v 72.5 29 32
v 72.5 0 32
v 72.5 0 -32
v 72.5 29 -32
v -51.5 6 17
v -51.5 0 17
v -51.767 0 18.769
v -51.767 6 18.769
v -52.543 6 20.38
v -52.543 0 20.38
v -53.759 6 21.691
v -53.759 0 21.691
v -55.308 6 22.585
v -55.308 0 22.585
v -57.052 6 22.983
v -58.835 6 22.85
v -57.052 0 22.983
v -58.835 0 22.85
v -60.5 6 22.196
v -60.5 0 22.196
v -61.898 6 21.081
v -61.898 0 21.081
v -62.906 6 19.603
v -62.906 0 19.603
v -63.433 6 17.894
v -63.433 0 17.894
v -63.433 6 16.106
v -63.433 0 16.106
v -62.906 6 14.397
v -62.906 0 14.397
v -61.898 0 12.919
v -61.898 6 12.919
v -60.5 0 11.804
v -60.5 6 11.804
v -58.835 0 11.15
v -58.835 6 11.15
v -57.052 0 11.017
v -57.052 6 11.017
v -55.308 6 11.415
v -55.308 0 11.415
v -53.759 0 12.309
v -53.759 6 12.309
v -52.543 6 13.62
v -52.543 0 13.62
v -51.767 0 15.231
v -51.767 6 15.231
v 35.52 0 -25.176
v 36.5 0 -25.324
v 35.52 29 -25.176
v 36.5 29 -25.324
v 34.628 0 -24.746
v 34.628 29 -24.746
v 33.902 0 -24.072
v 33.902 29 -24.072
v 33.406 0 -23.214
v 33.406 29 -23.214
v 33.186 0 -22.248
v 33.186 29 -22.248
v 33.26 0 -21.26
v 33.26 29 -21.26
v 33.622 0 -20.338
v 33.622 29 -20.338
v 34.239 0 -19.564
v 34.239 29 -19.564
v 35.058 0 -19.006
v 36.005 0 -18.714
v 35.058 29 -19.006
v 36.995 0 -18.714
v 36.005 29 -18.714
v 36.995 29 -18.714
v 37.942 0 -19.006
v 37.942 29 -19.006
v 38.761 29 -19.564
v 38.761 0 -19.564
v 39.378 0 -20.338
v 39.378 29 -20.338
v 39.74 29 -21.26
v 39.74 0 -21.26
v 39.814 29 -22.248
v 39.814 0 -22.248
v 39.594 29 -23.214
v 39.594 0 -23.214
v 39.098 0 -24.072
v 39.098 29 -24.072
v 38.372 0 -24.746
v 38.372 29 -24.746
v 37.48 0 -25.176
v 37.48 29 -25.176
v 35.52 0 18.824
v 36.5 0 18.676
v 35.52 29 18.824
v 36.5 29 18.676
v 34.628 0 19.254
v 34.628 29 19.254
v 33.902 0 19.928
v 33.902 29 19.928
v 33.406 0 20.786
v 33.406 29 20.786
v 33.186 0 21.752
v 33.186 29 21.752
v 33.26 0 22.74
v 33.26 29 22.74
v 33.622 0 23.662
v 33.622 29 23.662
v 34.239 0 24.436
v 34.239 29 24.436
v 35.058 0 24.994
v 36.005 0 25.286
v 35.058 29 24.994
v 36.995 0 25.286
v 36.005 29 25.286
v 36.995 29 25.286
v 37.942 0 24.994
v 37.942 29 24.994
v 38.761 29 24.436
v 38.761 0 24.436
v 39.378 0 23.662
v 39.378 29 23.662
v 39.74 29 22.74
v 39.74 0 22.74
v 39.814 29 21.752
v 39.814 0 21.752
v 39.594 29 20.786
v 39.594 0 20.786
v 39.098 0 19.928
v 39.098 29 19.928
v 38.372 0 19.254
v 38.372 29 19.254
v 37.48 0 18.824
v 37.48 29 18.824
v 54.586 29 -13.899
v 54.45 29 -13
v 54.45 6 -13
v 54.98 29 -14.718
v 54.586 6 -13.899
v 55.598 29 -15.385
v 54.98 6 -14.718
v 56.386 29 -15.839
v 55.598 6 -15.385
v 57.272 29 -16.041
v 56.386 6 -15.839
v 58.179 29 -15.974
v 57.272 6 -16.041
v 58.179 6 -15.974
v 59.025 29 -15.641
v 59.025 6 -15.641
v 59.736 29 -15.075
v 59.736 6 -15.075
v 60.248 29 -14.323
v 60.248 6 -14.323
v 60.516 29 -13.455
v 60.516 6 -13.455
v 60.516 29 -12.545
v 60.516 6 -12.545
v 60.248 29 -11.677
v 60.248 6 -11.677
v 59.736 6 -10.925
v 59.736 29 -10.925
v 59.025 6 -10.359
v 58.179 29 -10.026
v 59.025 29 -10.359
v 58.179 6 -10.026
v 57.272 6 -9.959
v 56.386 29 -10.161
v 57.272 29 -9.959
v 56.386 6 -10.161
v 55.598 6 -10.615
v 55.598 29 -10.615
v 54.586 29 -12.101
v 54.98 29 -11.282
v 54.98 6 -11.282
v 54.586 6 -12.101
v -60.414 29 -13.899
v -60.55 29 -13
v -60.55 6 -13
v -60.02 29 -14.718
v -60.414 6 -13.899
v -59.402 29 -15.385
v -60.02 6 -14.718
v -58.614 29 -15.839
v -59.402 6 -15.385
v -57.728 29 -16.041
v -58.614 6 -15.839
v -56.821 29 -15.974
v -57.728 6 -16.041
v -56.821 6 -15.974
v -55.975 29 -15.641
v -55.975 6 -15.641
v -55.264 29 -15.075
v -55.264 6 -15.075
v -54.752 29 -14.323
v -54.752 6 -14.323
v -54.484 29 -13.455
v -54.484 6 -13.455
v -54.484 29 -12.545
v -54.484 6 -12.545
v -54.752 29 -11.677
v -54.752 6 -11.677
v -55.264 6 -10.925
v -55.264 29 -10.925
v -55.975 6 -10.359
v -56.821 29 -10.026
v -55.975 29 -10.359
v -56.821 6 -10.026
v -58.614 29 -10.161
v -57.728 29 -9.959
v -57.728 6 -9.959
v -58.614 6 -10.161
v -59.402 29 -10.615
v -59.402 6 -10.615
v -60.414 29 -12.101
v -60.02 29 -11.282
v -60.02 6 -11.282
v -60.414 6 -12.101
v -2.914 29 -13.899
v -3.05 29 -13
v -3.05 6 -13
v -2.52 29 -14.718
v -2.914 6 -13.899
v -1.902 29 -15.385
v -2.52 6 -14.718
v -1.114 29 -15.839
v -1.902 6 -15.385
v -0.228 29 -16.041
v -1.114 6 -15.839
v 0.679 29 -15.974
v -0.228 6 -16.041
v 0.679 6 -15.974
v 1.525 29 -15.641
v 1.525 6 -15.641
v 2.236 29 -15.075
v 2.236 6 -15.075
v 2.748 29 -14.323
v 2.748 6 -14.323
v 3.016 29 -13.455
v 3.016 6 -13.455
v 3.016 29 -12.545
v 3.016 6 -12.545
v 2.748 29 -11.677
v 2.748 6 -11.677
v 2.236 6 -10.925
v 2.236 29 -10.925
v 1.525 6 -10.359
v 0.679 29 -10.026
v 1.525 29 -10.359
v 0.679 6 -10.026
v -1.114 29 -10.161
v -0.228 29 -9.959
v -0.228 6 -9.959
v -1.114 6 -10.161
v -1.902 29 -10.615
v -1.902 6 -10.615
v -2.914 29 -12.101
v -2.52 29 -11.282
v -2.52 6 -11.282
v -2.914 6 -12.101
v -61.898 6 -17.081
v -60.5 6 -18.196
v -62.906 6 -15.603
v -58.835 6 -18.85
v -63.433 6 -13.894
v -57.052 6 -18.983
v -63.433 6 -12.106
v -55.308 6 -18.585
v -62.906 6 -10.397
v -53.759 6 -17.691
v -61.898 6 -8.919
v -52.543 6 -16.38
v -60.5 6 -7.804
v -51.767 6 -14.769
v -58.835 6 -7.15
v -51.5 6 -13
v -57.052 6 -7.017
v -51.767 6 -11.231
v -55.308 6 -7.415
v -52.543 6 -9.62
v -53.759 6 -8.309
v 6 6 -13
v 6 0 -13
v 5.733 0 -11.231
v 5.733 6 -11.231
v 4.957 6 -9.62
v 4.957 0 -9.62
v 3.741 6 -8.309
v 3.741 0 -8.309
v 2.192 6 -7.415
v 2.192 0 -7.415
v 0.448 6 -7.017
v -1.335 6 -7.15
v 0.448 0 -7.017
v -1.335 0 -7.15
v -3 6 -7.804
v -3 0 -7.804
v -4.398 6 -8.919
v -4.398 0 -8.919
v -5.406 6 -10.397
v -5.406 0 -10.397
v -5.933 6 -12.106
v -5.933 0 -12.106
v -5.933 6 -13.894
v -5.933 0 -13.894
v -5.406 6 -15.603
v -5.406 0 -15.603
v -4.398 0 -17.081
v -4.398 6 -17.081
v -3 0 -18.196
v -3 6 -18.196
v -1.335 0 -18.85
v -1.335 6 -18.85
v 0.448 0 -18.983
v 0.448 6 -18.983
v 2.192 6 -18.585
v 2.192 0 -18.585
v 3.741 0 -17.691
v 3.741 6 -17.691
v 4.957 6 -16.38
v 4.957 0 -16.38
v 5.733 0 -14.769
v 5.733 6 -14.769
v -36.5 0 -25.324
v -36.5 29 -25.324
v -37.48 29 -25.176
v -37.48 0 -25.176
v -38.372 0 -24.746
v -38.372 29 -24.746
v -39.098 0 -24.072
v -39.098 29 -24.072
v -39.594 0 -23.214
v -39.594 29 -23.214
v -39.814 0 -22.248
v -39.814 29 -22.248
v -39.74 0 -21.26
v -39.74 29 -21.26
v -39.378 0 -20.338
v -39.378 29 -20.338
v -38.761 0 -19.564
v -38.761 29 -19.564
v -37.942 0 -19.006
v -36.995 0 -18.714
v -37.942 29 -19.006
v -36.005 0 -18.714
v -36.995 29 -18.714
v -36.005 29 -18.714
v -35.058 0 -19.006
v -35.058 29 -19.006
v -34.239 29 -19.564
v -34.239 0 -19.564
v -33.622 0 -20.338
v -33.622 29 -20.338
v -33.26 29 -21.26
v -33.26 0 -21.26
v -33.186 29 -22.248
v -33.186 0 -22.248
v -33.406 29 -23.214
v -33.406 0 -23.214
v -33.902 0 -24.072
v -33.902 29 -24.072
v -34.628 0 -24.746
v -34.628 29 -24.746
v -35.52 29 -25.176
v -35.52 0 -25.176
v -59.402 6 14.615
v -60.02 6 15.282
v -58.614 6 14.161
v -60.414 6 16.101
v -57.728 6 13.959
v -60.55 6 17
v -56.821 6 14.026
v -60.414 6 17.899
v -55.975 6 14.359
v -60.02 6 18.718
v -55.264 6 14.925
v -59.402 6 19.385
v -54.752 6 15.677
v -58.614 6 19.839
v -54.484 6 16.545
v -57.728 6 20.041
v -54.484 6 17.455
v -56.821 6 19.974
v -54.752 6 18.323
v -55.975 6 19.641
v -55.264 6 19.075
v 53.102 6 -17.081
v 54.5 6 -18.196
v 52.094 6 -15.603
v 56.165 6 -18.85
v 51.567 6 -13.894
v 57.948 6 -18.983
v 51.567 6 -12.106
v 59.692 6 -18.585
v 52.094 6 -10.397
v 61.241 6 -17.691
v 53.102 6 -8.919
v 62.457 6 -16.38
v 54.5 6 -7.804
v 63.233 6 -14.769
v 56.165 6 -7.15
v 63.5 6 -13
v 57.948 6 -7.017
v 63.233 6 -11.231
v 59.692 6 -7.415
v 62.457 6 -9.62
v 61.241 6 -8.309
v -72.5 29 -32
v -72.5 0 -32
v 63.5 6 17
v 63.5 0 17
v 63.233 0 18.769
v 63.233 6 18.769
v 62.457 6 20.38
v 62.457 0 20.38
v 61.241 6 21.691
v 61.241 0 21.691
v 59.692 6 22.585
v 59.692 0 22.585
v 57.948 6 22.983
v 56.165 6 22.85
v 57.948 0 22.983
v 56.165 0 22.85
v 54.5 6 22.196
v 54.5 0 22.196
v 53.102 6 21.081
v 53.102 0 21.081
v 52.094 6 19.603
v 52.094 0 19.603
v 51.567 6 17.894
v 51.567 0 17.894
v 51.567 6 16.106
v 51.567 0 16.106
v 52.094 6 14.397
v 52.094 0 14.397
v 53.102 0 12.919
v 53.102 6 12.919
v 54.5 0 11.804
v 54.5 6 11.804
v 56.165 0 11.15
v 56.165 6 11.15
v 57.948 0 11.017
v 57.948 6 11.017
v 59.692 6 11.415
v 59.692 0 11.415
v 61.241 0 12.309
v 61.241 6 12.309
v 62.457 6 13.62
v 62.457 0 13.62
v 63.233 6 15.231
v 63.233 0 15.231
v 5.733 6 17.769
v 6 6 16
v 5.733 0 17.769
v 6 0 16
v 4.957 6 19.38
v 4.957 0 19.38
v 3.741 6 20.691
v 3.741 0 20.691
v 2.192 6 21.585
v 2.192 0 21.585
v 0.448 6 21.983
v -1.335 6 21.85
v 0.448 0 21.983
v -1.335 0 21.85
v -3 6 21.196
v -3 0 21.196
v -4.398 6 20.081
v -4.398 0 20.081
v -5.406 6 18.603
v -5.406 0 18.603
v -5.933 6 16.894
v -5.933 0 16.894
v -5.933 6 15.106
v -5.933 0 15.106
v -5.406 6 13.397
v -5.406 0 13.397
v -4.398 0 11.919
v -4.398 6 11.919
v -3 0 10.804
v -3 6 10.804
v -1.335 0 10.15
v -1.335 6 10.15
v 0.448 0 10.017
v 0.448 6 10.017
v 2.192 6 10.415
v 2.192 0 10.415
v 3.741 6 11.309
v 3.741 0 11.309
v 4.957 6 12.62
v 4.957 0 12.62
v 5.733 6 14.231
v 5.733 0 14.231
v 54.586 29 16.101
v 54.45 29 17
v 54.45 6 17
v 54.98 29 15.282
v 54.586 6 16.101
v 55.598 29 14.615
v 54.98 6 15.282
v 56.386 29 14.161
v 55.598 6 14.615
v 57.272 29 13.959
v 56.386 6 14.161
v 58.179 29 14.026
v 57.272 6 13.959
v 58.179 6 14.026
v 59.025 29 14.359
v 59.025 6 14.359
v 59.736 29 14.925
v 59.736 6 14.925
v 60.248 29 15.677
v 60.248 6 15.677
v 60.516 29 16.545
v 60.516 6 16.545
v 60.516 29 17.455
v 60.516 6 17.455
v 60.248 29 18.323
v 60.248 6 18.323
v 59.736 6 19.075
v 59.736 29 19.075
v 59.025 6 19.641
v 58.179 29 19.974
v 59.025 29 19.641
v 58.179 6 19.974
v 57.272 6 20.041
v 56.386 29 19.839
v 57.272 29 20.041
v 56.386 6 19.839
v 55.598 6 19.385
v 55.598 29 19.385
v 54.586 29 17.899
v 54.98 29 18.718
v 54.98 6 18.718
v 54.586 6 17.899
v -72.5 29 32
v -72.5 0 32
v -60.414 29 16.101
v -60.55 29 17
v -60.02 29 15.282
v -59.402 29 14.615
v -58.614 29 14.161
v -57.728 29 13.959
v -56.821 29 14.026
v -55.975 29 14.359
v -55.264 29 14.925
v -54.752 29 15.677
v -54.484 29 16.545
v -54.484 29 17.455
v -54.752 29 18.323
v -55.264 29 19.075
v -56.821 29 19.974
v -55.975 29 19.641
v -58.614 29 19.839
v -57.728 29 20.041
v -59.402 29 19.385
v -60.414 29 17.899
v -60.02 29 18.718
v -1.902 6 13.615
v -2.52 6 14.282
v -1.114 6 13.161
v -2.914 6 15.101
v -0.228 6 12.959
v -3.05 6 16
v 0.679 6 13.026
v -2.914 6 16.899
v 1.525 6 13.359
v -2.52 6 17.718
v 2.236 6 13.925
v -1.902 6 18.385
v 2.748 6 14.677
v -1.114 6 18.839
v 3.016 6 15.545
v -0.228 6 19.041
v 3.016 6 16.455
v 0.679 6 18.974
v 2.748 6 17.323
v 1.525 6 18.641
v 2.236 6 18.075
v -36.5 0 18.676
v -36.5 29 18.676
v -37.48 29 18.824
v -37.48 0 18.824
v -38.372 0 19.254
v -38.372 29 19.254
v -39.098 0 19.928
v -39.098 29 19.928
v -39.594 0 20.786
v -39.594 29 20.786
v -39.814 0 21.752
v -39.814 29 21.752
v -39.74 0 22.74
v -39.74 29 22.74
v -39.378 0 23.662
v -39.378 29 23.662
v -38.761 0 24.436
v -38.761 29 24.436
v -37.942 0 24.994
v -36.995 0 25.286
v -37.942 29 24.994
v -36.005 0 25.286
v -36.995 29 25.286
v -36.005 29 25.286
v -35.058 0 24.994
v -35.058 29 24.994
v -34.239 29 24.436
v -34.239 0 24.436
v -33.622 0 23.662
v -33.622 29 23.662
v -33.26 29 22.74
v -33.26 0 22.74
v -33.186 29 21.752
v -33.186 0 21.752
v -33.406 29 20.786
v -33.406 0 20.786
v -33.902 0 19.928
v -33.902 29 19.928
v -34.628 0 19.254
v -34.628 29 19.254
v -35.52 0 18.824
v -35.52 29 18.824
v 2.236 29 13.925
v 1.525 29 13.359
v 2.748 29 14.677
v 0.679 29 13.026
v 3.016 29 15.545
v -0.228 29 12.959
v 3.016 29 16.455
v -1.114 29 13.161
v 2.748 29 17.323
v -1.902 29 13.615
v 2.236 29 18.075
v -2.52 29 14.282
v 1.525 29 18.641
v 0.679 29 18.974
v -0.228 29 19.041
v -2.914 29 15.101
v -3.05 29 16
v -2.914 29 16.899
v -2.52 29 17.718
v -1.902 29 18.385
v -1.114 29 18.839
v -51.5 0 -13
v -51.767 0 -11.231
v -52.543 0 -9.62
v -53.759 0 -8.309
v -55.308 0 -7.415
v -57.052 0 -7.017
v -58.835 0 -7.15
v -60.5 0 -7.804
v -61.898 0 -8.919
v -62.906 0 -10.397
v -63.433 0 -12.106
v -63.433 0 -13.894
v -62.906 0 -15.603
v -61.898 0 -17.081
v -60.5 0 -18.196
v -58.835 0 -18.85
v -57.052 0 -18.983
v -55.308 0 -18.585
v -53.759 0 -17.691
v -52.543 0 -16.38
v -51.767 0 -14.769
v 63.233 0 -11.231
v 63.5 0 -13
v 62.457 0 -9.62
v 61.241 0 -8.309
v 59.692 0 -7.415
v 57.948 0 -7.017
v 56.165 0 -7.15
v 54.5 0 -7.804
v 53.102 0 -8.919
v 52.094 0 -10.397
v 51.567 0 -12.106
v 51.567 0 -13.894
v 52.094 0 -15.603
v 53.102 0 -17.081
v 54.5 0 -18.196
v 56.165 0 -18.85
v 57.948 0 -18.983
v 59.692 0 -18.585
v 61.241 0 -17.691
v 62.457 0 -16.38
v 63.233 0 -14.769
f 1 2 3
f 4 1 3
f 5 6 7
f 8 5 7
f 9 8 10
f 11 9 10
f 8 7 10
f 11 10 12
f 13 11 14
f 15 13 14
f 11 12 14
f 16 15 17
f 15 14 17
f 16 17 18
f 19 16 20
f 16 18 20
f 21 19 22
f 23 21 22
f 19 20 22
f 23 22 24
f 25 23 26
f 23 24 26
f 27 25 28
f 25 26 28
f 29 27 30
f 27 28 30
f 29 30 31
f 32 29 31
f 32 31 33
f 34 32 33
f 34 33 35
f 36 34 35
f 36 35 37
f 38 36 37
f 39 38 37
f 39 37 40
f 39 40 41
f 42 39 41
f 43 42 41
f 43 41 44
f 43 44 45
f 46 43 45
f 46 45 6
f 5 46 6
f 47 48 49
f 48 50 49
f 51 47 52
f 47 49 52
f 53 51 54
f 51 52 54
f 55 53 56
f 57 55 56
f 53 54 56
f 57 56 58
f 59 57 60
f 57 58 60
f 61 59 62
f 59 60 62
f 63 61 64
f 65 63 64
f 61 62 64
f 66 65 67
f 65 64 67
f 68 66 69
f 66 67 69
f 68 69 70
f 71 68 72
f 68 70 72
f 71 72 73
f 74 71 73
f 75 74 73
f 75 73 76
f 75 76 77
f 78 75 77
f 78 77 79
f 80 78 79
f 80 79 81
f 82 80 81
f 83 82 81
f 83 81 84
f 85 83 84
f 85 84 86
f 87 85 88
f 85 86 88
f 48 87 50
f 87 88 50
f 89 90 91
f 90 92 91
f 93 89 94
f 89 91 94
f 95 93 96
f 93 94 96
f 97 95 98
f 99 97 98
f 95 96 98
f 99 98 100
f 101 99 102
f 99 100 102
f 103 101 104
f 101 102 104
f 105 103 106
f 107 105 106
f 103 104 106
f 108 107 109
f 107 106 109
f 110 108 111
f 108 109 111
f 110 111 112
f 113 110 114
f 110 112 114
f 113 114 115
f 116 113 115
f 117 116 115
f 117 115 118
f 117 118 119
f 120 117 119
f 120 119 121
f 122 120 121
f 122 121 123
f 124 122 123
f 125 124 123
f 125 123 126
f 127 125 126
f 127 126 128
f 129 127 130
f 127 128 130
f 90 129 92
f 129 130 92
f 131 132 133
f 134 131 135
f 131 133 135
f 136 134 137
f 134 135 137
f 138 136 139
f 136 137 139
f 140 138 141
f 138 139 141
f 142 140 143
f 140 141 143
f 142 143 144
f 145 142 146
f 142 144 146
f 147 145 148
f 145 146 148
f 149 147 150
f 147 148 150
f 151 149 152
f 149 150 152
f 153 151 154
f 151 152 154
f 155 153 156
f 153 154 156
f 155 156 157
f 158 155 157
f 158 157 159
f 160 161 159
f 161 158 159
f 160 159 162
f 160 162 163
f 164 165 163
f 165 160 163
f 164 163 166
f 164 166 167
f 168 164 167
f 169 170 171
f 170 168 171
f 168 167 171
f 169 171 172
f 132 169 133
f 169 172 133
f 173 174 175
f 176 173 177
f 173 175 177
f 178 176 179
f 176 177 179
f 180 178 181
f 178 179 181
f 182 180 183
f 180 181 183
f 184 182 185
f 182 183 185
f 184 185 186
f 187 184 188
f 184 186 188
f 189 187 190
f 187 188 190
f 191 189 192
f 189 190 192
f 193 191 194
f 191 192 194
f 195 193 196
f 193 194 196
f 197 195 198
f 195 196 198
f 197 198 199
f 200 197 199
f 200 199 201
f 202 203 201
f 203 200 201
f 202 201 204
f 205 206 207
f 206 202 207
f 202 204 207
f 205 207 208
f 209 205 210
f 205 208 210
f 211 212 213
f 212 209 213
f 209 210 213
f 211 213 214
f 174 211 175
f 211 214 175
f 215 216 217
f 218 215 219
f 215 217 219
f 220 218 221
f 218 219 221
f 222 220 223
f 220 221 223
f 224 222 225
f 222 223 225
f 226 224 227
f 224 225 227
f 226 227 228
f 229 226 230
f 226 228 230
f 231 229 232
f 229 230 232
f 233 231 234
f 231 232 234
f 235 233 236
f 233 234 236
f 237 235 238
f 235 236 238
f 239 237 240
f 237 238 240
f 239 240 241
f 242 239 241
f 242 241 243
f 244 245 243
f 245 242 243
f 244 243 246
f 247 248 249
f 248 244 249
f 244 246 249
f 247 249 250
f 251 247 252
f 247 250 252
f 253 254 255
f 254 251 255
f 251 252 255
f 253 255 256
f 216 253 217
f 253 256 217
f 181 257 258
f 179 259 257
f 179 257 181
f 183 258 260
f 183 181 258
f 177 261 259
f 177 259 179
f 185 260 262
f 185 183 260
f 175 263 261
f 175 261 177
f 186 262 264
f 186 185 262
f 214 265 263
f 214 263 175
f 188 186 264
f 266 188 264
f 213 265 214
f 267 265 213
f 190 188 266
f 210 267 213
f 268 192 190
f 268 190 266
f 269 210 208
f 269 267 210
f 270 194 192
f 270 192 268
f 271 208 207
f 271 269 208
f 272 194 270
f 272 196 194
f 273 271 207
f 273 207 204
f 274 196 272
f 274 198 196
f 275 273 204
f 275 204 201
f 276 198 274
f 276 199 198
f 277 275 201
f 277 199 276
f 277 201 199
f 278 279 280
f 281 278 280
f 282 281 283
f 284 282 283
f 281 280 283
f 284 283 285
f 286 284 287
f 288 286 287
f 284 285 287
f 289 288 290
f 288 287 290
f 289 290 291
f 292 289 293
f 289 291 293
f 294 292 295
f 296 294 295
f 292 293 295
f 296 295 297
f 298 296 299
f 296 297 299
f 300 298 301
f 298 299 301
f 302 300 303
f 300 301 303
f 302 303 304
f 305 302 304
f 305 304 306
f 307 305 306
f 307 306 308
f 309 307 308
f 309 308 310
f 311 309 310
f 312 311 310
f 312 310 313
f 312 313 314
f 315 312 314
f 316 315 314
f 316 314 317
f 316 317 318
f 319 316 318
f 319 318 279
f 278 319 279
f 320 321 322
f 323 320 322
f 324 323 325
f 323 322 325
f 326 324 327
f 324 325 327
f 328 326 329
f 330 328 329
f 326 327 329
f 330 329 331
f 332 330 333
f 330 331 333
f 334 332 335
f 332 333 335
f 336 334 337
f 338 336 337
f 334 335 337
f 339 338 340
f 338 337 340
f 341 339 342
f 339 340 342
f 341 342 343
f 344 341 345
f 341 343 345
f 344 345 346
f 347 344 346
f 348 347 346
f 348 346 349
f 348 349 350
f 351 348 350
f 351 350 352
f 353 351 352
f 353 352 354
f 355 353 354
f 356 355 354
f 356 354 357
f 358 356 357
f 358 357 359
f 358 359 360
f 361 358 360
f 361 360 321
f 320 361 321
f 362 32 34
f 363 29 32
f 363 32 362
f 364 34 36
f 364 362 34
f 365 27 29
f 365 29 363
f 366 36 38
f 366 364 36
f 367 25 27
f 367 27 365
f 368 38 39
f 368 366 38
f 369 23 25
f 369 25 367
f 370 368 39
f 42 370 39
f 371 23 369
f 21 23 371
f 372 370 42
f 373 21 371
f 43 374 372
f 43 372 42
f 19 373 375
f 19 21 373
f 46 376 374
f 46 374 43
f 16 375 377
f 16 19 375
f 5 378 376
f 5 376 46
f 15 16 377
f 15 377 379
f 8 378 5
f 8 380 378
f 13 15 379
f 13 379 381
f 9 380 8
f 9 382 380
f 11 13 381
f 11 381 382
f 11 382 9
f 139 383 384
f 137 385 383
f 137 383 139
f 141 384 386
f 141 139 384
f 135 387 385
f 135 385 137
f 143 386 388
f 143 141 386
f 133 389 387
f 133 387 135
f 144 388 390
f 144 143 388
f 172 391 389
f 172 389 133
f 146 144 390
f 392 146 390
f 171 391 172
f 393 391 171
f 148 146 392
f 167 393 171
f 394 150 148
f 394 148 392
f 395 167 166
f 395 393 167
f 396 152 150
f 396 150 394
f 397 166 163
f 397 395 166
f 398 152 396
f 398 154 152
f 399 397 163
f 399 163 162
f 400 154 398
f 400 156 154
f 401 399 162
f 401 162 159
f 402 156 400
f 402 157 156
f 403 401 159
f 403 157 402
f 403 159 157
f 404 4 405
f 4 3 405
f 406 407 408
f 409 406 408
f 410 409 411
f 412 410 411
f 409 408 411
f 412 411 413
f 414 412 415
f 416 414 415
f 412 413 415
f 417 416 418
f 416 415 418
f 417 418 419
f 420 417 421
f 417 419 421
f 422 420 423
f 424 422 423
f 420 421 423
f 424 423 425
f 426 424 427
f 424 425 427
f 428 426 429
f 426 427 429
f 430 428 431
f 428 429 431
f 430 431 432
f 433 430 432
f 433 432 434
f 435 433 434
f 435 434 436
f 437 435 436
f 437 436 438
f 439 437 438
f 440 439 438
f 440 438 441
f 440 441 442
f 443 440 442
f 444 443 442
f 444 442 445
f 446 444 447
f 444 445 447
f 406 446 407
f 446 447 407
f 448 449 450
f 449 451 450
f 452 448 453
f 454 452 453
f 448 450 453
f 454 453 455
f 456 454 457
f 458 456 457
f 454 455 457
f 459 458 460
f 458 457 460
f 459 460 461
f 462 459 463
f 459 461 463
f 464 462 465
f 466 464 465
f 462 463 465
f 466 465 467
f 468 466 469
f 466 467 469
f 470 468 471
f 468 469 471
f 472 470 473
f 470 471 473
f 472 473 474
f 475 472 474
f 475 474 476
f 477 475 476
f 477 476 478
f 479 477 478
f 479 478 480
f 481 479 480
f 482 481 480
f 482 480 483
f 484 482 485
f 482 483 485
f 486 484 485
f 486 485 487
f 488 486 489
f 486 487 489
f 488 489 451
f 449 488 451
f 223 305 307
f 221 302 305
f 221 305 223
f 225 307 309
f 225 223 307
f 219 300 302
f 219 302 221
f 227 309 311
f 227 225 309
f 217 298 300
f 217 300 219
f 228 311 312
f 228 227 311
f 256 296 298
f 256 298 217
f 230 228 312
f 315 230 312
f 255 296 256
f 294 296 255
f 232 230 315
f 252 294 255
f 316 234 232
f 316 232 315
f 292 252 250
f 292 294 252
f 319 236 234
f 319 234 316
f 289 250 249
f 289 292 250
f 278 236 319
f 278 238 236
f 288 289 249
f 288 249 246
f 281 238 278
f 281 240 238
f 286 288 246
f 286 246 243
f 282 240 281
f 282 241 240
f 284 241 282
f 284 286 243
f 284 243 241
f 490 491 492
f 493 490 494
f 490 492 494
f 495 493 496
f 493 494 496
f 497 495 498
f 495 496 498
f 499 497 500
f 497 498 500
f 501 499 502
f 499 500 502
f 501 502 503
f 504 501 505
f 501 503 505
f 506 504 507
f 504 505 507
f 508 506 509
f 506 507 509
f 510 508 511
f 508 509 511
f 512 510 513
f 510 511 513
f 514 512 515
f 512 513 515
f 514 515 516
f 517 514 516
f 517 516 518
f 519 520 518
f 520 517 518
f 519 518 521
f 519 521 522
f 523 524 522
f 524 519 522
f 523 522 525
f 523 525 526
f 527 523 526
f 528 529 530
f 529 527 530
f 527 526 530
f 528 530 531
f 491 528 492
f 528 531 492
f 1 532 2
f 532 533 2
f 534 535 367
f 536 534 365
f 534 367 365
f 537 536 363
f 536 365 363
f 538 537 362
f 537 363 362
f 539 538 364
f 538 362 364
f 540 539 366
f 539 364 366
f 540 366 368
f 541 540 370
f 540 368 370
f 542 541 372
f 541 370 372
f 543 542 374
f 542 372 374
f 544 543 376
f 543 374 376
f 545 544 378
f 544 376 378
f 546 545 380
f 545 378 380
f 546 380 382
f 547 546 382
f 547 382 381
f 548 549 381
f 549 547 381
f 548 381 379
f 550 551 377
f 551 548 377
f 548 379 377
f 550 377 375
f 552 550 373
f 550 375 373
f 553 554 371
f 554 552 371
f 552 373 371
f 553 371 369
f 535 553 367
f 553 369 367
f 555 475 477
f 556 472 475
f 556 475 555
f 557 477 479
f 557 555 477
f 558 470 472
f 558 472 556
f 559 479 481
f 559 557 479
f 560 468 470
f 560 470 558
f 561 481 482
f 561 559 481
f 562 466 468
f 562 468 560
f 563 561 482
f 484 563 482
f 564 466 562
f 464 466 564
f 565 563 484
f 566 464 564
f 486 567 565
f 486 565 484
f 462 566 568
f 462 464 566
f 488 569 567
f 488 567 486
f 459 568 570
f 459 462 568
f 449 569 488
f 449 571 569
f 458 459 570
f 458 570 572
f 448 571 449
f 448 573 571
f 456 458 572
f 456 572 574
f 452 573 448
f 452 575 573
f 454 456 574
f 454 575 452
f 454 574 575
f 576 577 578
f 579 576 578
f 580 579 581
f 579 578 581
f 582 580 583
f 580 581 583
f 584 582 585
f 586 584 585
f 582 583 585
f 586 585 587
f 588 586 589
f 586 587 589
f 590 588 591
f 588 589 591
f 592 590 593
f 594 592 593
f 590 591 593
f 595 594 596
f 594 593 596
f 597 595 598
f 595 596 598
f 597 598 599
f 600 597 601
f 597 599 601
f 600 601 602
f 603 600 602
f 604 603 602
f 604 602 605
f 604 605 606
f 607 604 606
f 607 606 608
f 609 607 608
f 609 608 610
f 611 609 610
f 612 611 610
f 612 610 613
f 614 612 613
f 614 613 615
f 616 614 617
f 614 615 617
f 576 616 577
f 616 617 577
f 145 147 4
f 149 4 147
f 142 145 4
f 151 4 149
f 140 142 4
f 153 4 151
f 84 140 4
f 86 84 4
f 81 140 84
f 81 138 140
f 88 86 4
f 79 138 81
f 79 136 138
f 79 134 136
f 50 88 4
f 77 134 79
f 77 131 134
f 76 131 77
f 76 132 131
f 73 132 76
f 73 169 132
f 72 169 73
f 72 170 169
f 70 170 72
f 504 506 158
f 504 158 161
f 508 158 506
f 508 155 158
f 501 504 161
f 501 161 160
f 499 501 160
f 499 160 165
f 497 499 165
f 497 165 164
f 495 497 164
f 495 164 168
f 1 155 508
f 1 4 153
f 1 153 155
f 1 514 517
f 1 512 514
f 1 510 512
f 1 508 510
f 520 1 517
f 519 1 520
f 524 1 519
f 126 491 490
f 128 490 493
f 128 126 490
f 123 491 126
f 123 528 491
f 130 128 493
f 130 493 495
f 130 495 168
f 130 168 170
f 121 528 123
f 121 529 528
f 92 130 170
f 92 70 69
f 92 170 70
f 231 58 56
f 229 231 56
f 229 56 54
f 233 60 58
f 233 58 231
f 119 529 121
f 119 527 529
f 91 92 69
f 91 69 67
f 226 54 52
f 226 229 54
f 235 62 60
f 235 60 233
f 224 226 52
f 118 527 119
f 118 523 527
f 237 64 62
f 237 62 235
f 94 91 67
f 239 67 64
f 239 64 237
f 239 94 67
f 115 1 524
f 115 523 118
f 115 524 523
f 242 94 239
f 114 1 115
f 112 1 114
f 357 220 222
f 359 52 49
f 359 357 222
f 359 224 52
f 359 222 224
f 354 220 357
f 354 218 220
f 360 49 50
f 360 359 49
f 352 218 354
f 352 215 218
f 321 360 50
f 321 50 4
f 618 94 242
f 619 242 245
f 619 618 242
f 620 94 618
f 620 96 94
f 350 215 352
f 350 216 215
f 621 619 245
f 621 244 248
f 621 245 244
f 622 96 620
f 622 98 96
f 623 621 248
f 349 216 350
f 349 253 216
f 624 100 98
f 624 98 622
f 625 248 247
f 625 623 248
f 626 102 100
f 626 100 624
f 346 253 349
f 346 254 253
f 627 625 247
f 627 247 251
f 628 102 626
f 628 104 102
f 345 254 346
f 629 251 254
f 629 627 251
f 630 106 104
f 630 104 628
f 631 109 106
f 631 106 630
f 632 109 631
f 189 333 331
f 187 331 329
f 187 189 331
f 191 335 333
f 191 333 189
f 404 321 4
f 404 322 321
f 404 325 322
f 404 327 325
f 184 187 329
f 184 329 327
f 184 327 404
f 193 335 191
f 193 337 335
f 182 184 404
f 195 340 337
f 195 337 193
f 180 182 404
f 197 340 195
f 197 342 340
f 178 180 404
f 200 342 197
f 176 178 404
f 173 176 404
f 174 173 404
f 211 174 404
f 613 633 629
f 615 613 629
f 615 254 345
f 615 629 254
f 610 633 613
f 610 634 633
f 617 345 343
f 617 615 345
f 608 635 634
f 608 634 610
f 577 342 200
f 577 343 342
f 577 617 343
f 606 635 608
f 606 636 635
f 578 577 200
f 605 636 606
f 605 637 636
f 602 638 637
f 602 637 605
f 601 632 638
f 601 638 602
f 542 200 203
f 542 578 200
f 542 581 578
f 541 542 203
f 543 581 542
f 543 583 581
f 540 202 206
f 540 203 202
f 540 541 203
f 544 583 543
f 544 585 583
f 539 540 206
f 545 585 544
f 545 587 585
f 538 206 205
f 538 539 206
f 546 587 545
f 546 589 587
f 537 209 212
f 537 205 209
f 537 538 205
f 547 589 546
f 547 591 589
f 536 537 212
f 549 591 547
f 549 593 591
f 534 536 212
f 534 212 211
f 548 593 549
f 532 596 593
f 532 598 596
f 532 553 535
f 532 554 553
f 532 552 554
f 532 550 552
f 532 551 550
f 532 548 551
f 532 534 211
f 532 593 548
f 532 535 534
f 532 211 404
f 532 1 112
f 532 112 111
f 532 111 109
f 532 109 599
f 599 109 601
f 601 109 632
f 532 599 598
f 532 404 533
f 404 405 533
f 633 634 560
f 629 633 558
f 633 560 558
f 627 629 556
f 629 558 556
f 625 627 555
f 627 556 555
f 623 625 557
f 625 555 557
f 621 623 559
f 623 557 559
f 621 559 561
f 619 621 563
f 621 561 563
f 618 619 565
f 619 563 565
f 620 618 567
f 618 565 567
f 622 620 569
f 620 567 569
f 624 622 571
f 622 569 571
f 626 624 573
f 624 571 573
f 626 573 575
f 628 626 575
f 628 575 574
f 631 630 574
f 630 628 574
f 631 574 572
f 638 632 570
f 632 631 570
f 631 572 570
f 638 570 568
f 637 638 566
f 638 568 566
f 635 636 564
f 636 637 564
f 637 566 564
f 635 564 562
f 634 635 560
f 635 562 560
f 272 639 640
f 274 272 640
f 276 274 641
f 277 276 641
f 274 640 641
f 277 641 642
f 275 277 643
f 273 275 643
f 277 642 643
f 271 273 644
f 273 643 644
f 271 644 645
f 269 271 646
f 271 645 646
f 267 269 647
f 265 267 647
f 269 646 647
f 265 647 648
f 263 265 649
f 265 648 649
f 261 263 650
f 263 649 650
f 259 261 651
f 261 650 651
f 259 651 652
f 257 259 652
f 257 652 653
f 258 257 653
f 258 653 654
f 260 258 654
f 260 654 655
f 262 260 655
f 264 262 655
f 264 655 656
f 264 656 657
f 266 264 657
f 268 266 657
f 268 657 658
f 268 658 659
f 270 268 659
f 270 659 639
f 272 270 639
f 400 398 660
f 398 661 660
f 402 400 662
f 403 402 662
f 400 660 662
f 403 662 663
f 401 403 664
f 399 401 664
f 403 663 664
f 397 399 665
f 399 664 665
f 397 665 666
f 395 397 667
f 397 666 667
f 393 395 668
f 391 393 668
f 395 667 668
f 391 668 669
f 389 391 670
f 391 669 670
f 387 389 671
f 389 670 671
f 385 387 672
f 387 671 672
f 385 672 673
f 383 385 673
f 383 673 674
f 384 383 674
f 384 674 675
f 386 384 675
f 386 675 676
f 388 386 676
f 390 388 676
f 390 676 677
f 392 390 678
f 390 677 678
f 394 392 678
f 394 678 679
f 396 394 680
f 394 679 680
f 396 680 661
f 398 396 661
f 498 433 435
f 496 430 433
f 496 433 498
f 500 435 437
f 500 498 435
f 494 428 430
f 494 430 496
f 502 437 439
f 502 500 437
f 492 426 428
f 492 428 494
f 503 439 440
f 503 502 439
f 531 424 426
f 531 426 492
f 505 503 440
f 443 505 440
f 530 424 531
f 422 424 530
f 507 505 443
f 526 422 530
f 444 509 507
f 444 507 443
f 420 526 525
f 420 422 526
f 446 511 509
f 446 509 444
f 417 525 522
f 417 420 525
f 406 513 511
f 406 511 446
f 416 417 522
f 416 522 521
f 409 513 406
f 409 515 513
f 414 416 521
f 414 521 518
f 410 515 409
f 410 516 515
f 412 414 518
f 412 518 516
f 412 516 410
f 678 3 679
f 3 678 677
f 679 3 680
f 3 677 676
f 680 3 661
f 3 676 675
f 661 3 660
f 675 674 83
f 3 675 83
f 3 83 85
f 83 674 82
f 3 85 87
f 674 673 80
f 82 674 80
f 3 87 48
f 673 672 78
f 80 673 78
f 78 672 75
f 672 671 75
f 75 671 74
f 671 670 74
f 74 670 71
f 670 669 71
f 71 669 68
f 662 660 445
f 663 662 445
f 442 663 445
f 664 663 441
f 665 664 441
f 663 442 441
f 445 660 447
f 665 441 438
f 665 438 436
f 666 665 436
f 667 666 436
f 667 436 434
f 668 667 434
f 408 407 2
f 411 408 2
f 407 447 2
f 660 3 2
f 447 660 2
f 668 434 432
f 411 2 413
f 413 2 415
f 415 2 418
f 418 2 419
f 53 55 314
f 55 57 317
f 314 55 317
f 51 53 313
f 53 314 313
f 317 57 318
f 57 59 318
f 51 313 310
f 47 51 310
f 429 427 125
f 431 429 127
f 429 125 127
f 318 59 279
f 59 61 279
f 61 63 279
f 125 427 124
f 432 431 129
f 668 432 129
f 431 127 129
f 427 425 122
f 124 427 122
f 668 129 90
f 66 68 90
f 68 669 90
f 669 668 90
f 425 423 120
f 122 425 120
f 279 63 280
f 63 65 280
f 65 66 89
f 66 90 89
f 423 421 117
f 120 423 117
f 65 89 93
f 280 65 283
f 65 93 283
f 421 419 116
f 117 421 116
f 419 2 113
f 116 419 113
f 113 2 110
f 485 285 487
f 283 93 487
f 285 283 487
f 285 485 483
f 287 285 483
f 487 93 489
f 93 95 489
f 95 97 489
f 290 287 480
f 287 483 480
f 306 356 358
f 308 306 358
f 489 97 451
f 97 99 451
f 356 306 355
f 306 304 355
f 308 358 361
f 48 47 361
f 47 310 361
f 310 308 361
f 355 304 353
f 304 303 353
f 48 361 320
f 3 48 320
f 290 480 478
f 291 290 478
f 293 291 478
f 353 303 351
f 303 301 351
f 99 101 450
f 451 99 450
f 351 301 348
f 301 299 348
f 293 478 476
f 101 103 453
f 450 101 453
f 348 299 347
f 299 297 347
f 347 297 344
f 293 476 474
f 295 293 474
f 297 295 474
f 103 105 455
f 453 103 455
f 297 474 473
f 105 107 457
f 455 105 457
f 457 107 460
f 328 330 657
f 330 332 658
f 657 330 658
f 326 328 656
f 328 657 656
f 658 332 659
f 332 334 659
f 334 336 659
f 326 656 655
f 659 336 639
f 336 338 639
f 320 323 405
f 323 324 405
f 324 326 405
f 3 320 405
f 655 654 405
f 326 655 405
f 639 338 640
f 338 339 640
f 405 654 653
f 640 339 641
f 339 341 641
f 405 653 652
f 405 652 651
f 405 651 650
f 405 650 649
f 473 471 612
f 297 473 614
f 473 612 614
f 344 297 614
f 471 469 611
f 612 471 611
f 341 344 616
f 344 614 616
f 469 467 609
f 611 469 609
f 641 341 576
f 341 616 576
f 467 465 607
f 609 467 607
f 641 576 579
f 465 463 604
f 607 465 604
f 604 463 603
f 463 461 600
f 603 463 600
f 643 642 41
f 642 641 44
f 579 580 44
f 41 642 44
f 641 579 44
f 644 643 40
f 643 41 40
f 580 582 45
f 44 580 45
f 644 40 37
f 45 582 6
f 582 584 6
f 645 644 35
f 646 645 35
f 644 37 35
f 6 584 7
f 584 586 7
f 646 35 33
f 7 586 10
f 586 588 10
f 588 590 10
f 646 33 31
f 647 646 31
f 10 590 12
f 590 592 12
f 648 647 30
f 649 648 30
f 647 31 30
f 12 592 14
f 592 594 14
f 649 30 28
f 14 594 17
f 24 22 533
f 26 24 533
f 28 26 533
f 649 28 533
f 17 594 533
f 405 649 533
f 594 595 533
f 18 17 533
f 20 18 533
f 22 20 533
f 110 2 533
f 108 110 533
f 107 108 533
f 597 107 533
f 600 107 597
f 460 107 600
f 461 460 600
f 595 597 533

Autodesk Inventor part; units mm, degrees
ref_plane "YZ Plane" through (0, 0, 0) normal (1, 0, 0) x (0, 1, 0)
ref_plane "XZ Plane" through (0, 0, 0) normal (0, 1, 0) x (-1, 0, 0)
ref_plane "XY Plane" through (0, 0, 0) normal (0, 0, 1) x (1, 0, 0)
sketch "Sketch1" plane through (0, 0, 0) normal (0, 1, 0) x (-1, 0, 0)
  line L0 (72.5, 32) -> (-72.5, 32)
  line L1 (-72.5, 32) -> (-72.5, -32)
  line L2 (-72.5, -32) -> (72.5, -32)
  line L3 (72.5, -32) -> (72.5, 32)
  line L4 (72.5, 32) -> (-72.5, -32) construction
  line L5 (-72.5, 32) -> (72.5, -32) construction
  line L6 (0, 0) -> (0, -32) construction
  line L7 (0, 0) -> (0, 32) construction
  circle A0 centre (0, -13) radius 3.05
  circle A1 centre (0, 16) radius 3.05
  circle A2 centre (57.5, -13) radius 3.05
  circle A3 centre (57.5, 17) radius 3.05
  line L8 (57.5, -13) -> (57.5, 17) construction
  circle A4 centre (-57.5, -13) radius 3.05
  circle A5 centre (-57.5, 17) radius 3.05
  point P0 (57.5, 2)
  dimension "d0" = 145
  dimension "d1" = 64
  dimension "d2" = 6.1
  dimension "d3" = 6.1
  dimension "d4" = 15
  dimension "d5" = 30
  dimension "d18" = 2
extrude "Extrusion1" add sketch "Sketch1" along normal blind 29
sketch "Sketch2" plane through (0, 0, 0) normal (0, -1, 0) x (1, 0, 0)
  arc A0 (-35.5, 17.5) -> (-35.5, 26.5) centre (-35.5, 22) ccw projected
  line L0 (-37.5, 17.5) -> (-35.5, 17.5) projected
  arc A1 (-37.5, 26.5) -> (-37.5, 17.5) centre (-37.5, 22) ccw projected
  line L1 (-35.5, 26.5) -> (-37.5, 26.5) projected
  line L2 (-35.5, -17.5) -> (-37.5, -17.5) projected
  arc A2 (-35.5, -26.5) -> (-35.5, -17.5) centre (-35.5, -22) ccw projected
  line L3 (-37.5, -26.5) -> (-35.5, -26.5) projected
  arc A3 (-37.5, -17.5) -> (-37.5, -26.5) centre (-37.5, -22) ccw projected
  line L4 (35.5, -26.5) -> (37.5, -26.5) projected
  arc A4 (35.5, -17.5) -> (35.5, -26.5) centre (35.5, -22) ccw projected
  line L5 (37.5, -17.5) -> (35.5, -17.5) projected
  arc A5 (37.5, -26.5) -> (37.5, -17.5) centre (37.5, -22) ccw projected
  line L6 (37.5, 26.5) -> (35.5, 26.5) projected
  arc A6 (37.5, 17.5) -> (37.5, 26.5) centre (37.5, 22) ccw projected
  line L7 (35.5, 17.5) -> (37.5, 17.5) projected
  arc A7 (35.5, 26.5) -> (35.5, 17.5) centre (35.5, 22) ccw projected
  circle A8 centre (36.5, 0) radius 4.5 projected
  circle A9 centre (-36.5, 0) radius 4.5 projected
  line L8 (47, -32) -> (-47, -32) projected
  line L9 (47, 32) -> (47, -32) projected
  line L10 (-47, 32) -> (47, 32) projected
  line L11 (-47, -32) -> (-47, 32) projected
  circle A10 centre (0, 0) radius 20 projected
  line L12 (-37.5, -22) -> (-35.5, -22)
  line L13 (35.5, -22) -> (37.5, -22)
  line L14 (35.5, 22) -> (37.5, 22)
  line L15 (-37.5, 22) -> (-35.5, 22)
  point P0 (0, 0)
  point P1 (-36.5, -22)
  point P2 (-36.5, 22)
  point P3 (36.5, 22)
  point P4 (36.5, -22)
hole "Hole1" at (-36.5, 0, -22) at (-36.5, 0, 22) at (36.5, 0, 22) at (36.5, 0, -22) direction (0, 1, 0) diameter 6.647 end through all thread size "M8x1.25" class "6H" standard "ISO Metric profile"
sketch "Sketch4" plane through (0, 0, 0) normal (0, -1, 0) x (1, 0, 0)
  circle A0 centre (-57.5, 17) radius 3.05 projected
  circle A1 centre (-57.5, -13) radius 3.05 projected
  circle A2 centre (0, -13) radius 3.05 projected
  circle A3 centre (0, 16) radius 3.05 projected
  circle A4 centre (57.5, 17) radius 3.05 projected
  circle A5 centre (57.5, -13) radius 3.05 projected
  circle A6 centre (-57.5, 17) radius 6
  circle A7 centre (-57.5, -13) radius 6
  circle A8 centre (0, 16) radius 6
  circle A9 centre (0, -13) radius 6
  circle A10 centre (57.5, 17) radius 6
  circle A11 centre (57.5, -13) radius 6
  point P0 (0, 0)
  dimension "d15" = 12
extrude "Extrusion2" cut sketch "Sketch4" against normal blind 6 contours A0 | A1 | A2 | A3 | A4 | A5 | A6 | A7 | A8 | A9 | A10 | A11
properties part number "assist_wheel_bracket"
